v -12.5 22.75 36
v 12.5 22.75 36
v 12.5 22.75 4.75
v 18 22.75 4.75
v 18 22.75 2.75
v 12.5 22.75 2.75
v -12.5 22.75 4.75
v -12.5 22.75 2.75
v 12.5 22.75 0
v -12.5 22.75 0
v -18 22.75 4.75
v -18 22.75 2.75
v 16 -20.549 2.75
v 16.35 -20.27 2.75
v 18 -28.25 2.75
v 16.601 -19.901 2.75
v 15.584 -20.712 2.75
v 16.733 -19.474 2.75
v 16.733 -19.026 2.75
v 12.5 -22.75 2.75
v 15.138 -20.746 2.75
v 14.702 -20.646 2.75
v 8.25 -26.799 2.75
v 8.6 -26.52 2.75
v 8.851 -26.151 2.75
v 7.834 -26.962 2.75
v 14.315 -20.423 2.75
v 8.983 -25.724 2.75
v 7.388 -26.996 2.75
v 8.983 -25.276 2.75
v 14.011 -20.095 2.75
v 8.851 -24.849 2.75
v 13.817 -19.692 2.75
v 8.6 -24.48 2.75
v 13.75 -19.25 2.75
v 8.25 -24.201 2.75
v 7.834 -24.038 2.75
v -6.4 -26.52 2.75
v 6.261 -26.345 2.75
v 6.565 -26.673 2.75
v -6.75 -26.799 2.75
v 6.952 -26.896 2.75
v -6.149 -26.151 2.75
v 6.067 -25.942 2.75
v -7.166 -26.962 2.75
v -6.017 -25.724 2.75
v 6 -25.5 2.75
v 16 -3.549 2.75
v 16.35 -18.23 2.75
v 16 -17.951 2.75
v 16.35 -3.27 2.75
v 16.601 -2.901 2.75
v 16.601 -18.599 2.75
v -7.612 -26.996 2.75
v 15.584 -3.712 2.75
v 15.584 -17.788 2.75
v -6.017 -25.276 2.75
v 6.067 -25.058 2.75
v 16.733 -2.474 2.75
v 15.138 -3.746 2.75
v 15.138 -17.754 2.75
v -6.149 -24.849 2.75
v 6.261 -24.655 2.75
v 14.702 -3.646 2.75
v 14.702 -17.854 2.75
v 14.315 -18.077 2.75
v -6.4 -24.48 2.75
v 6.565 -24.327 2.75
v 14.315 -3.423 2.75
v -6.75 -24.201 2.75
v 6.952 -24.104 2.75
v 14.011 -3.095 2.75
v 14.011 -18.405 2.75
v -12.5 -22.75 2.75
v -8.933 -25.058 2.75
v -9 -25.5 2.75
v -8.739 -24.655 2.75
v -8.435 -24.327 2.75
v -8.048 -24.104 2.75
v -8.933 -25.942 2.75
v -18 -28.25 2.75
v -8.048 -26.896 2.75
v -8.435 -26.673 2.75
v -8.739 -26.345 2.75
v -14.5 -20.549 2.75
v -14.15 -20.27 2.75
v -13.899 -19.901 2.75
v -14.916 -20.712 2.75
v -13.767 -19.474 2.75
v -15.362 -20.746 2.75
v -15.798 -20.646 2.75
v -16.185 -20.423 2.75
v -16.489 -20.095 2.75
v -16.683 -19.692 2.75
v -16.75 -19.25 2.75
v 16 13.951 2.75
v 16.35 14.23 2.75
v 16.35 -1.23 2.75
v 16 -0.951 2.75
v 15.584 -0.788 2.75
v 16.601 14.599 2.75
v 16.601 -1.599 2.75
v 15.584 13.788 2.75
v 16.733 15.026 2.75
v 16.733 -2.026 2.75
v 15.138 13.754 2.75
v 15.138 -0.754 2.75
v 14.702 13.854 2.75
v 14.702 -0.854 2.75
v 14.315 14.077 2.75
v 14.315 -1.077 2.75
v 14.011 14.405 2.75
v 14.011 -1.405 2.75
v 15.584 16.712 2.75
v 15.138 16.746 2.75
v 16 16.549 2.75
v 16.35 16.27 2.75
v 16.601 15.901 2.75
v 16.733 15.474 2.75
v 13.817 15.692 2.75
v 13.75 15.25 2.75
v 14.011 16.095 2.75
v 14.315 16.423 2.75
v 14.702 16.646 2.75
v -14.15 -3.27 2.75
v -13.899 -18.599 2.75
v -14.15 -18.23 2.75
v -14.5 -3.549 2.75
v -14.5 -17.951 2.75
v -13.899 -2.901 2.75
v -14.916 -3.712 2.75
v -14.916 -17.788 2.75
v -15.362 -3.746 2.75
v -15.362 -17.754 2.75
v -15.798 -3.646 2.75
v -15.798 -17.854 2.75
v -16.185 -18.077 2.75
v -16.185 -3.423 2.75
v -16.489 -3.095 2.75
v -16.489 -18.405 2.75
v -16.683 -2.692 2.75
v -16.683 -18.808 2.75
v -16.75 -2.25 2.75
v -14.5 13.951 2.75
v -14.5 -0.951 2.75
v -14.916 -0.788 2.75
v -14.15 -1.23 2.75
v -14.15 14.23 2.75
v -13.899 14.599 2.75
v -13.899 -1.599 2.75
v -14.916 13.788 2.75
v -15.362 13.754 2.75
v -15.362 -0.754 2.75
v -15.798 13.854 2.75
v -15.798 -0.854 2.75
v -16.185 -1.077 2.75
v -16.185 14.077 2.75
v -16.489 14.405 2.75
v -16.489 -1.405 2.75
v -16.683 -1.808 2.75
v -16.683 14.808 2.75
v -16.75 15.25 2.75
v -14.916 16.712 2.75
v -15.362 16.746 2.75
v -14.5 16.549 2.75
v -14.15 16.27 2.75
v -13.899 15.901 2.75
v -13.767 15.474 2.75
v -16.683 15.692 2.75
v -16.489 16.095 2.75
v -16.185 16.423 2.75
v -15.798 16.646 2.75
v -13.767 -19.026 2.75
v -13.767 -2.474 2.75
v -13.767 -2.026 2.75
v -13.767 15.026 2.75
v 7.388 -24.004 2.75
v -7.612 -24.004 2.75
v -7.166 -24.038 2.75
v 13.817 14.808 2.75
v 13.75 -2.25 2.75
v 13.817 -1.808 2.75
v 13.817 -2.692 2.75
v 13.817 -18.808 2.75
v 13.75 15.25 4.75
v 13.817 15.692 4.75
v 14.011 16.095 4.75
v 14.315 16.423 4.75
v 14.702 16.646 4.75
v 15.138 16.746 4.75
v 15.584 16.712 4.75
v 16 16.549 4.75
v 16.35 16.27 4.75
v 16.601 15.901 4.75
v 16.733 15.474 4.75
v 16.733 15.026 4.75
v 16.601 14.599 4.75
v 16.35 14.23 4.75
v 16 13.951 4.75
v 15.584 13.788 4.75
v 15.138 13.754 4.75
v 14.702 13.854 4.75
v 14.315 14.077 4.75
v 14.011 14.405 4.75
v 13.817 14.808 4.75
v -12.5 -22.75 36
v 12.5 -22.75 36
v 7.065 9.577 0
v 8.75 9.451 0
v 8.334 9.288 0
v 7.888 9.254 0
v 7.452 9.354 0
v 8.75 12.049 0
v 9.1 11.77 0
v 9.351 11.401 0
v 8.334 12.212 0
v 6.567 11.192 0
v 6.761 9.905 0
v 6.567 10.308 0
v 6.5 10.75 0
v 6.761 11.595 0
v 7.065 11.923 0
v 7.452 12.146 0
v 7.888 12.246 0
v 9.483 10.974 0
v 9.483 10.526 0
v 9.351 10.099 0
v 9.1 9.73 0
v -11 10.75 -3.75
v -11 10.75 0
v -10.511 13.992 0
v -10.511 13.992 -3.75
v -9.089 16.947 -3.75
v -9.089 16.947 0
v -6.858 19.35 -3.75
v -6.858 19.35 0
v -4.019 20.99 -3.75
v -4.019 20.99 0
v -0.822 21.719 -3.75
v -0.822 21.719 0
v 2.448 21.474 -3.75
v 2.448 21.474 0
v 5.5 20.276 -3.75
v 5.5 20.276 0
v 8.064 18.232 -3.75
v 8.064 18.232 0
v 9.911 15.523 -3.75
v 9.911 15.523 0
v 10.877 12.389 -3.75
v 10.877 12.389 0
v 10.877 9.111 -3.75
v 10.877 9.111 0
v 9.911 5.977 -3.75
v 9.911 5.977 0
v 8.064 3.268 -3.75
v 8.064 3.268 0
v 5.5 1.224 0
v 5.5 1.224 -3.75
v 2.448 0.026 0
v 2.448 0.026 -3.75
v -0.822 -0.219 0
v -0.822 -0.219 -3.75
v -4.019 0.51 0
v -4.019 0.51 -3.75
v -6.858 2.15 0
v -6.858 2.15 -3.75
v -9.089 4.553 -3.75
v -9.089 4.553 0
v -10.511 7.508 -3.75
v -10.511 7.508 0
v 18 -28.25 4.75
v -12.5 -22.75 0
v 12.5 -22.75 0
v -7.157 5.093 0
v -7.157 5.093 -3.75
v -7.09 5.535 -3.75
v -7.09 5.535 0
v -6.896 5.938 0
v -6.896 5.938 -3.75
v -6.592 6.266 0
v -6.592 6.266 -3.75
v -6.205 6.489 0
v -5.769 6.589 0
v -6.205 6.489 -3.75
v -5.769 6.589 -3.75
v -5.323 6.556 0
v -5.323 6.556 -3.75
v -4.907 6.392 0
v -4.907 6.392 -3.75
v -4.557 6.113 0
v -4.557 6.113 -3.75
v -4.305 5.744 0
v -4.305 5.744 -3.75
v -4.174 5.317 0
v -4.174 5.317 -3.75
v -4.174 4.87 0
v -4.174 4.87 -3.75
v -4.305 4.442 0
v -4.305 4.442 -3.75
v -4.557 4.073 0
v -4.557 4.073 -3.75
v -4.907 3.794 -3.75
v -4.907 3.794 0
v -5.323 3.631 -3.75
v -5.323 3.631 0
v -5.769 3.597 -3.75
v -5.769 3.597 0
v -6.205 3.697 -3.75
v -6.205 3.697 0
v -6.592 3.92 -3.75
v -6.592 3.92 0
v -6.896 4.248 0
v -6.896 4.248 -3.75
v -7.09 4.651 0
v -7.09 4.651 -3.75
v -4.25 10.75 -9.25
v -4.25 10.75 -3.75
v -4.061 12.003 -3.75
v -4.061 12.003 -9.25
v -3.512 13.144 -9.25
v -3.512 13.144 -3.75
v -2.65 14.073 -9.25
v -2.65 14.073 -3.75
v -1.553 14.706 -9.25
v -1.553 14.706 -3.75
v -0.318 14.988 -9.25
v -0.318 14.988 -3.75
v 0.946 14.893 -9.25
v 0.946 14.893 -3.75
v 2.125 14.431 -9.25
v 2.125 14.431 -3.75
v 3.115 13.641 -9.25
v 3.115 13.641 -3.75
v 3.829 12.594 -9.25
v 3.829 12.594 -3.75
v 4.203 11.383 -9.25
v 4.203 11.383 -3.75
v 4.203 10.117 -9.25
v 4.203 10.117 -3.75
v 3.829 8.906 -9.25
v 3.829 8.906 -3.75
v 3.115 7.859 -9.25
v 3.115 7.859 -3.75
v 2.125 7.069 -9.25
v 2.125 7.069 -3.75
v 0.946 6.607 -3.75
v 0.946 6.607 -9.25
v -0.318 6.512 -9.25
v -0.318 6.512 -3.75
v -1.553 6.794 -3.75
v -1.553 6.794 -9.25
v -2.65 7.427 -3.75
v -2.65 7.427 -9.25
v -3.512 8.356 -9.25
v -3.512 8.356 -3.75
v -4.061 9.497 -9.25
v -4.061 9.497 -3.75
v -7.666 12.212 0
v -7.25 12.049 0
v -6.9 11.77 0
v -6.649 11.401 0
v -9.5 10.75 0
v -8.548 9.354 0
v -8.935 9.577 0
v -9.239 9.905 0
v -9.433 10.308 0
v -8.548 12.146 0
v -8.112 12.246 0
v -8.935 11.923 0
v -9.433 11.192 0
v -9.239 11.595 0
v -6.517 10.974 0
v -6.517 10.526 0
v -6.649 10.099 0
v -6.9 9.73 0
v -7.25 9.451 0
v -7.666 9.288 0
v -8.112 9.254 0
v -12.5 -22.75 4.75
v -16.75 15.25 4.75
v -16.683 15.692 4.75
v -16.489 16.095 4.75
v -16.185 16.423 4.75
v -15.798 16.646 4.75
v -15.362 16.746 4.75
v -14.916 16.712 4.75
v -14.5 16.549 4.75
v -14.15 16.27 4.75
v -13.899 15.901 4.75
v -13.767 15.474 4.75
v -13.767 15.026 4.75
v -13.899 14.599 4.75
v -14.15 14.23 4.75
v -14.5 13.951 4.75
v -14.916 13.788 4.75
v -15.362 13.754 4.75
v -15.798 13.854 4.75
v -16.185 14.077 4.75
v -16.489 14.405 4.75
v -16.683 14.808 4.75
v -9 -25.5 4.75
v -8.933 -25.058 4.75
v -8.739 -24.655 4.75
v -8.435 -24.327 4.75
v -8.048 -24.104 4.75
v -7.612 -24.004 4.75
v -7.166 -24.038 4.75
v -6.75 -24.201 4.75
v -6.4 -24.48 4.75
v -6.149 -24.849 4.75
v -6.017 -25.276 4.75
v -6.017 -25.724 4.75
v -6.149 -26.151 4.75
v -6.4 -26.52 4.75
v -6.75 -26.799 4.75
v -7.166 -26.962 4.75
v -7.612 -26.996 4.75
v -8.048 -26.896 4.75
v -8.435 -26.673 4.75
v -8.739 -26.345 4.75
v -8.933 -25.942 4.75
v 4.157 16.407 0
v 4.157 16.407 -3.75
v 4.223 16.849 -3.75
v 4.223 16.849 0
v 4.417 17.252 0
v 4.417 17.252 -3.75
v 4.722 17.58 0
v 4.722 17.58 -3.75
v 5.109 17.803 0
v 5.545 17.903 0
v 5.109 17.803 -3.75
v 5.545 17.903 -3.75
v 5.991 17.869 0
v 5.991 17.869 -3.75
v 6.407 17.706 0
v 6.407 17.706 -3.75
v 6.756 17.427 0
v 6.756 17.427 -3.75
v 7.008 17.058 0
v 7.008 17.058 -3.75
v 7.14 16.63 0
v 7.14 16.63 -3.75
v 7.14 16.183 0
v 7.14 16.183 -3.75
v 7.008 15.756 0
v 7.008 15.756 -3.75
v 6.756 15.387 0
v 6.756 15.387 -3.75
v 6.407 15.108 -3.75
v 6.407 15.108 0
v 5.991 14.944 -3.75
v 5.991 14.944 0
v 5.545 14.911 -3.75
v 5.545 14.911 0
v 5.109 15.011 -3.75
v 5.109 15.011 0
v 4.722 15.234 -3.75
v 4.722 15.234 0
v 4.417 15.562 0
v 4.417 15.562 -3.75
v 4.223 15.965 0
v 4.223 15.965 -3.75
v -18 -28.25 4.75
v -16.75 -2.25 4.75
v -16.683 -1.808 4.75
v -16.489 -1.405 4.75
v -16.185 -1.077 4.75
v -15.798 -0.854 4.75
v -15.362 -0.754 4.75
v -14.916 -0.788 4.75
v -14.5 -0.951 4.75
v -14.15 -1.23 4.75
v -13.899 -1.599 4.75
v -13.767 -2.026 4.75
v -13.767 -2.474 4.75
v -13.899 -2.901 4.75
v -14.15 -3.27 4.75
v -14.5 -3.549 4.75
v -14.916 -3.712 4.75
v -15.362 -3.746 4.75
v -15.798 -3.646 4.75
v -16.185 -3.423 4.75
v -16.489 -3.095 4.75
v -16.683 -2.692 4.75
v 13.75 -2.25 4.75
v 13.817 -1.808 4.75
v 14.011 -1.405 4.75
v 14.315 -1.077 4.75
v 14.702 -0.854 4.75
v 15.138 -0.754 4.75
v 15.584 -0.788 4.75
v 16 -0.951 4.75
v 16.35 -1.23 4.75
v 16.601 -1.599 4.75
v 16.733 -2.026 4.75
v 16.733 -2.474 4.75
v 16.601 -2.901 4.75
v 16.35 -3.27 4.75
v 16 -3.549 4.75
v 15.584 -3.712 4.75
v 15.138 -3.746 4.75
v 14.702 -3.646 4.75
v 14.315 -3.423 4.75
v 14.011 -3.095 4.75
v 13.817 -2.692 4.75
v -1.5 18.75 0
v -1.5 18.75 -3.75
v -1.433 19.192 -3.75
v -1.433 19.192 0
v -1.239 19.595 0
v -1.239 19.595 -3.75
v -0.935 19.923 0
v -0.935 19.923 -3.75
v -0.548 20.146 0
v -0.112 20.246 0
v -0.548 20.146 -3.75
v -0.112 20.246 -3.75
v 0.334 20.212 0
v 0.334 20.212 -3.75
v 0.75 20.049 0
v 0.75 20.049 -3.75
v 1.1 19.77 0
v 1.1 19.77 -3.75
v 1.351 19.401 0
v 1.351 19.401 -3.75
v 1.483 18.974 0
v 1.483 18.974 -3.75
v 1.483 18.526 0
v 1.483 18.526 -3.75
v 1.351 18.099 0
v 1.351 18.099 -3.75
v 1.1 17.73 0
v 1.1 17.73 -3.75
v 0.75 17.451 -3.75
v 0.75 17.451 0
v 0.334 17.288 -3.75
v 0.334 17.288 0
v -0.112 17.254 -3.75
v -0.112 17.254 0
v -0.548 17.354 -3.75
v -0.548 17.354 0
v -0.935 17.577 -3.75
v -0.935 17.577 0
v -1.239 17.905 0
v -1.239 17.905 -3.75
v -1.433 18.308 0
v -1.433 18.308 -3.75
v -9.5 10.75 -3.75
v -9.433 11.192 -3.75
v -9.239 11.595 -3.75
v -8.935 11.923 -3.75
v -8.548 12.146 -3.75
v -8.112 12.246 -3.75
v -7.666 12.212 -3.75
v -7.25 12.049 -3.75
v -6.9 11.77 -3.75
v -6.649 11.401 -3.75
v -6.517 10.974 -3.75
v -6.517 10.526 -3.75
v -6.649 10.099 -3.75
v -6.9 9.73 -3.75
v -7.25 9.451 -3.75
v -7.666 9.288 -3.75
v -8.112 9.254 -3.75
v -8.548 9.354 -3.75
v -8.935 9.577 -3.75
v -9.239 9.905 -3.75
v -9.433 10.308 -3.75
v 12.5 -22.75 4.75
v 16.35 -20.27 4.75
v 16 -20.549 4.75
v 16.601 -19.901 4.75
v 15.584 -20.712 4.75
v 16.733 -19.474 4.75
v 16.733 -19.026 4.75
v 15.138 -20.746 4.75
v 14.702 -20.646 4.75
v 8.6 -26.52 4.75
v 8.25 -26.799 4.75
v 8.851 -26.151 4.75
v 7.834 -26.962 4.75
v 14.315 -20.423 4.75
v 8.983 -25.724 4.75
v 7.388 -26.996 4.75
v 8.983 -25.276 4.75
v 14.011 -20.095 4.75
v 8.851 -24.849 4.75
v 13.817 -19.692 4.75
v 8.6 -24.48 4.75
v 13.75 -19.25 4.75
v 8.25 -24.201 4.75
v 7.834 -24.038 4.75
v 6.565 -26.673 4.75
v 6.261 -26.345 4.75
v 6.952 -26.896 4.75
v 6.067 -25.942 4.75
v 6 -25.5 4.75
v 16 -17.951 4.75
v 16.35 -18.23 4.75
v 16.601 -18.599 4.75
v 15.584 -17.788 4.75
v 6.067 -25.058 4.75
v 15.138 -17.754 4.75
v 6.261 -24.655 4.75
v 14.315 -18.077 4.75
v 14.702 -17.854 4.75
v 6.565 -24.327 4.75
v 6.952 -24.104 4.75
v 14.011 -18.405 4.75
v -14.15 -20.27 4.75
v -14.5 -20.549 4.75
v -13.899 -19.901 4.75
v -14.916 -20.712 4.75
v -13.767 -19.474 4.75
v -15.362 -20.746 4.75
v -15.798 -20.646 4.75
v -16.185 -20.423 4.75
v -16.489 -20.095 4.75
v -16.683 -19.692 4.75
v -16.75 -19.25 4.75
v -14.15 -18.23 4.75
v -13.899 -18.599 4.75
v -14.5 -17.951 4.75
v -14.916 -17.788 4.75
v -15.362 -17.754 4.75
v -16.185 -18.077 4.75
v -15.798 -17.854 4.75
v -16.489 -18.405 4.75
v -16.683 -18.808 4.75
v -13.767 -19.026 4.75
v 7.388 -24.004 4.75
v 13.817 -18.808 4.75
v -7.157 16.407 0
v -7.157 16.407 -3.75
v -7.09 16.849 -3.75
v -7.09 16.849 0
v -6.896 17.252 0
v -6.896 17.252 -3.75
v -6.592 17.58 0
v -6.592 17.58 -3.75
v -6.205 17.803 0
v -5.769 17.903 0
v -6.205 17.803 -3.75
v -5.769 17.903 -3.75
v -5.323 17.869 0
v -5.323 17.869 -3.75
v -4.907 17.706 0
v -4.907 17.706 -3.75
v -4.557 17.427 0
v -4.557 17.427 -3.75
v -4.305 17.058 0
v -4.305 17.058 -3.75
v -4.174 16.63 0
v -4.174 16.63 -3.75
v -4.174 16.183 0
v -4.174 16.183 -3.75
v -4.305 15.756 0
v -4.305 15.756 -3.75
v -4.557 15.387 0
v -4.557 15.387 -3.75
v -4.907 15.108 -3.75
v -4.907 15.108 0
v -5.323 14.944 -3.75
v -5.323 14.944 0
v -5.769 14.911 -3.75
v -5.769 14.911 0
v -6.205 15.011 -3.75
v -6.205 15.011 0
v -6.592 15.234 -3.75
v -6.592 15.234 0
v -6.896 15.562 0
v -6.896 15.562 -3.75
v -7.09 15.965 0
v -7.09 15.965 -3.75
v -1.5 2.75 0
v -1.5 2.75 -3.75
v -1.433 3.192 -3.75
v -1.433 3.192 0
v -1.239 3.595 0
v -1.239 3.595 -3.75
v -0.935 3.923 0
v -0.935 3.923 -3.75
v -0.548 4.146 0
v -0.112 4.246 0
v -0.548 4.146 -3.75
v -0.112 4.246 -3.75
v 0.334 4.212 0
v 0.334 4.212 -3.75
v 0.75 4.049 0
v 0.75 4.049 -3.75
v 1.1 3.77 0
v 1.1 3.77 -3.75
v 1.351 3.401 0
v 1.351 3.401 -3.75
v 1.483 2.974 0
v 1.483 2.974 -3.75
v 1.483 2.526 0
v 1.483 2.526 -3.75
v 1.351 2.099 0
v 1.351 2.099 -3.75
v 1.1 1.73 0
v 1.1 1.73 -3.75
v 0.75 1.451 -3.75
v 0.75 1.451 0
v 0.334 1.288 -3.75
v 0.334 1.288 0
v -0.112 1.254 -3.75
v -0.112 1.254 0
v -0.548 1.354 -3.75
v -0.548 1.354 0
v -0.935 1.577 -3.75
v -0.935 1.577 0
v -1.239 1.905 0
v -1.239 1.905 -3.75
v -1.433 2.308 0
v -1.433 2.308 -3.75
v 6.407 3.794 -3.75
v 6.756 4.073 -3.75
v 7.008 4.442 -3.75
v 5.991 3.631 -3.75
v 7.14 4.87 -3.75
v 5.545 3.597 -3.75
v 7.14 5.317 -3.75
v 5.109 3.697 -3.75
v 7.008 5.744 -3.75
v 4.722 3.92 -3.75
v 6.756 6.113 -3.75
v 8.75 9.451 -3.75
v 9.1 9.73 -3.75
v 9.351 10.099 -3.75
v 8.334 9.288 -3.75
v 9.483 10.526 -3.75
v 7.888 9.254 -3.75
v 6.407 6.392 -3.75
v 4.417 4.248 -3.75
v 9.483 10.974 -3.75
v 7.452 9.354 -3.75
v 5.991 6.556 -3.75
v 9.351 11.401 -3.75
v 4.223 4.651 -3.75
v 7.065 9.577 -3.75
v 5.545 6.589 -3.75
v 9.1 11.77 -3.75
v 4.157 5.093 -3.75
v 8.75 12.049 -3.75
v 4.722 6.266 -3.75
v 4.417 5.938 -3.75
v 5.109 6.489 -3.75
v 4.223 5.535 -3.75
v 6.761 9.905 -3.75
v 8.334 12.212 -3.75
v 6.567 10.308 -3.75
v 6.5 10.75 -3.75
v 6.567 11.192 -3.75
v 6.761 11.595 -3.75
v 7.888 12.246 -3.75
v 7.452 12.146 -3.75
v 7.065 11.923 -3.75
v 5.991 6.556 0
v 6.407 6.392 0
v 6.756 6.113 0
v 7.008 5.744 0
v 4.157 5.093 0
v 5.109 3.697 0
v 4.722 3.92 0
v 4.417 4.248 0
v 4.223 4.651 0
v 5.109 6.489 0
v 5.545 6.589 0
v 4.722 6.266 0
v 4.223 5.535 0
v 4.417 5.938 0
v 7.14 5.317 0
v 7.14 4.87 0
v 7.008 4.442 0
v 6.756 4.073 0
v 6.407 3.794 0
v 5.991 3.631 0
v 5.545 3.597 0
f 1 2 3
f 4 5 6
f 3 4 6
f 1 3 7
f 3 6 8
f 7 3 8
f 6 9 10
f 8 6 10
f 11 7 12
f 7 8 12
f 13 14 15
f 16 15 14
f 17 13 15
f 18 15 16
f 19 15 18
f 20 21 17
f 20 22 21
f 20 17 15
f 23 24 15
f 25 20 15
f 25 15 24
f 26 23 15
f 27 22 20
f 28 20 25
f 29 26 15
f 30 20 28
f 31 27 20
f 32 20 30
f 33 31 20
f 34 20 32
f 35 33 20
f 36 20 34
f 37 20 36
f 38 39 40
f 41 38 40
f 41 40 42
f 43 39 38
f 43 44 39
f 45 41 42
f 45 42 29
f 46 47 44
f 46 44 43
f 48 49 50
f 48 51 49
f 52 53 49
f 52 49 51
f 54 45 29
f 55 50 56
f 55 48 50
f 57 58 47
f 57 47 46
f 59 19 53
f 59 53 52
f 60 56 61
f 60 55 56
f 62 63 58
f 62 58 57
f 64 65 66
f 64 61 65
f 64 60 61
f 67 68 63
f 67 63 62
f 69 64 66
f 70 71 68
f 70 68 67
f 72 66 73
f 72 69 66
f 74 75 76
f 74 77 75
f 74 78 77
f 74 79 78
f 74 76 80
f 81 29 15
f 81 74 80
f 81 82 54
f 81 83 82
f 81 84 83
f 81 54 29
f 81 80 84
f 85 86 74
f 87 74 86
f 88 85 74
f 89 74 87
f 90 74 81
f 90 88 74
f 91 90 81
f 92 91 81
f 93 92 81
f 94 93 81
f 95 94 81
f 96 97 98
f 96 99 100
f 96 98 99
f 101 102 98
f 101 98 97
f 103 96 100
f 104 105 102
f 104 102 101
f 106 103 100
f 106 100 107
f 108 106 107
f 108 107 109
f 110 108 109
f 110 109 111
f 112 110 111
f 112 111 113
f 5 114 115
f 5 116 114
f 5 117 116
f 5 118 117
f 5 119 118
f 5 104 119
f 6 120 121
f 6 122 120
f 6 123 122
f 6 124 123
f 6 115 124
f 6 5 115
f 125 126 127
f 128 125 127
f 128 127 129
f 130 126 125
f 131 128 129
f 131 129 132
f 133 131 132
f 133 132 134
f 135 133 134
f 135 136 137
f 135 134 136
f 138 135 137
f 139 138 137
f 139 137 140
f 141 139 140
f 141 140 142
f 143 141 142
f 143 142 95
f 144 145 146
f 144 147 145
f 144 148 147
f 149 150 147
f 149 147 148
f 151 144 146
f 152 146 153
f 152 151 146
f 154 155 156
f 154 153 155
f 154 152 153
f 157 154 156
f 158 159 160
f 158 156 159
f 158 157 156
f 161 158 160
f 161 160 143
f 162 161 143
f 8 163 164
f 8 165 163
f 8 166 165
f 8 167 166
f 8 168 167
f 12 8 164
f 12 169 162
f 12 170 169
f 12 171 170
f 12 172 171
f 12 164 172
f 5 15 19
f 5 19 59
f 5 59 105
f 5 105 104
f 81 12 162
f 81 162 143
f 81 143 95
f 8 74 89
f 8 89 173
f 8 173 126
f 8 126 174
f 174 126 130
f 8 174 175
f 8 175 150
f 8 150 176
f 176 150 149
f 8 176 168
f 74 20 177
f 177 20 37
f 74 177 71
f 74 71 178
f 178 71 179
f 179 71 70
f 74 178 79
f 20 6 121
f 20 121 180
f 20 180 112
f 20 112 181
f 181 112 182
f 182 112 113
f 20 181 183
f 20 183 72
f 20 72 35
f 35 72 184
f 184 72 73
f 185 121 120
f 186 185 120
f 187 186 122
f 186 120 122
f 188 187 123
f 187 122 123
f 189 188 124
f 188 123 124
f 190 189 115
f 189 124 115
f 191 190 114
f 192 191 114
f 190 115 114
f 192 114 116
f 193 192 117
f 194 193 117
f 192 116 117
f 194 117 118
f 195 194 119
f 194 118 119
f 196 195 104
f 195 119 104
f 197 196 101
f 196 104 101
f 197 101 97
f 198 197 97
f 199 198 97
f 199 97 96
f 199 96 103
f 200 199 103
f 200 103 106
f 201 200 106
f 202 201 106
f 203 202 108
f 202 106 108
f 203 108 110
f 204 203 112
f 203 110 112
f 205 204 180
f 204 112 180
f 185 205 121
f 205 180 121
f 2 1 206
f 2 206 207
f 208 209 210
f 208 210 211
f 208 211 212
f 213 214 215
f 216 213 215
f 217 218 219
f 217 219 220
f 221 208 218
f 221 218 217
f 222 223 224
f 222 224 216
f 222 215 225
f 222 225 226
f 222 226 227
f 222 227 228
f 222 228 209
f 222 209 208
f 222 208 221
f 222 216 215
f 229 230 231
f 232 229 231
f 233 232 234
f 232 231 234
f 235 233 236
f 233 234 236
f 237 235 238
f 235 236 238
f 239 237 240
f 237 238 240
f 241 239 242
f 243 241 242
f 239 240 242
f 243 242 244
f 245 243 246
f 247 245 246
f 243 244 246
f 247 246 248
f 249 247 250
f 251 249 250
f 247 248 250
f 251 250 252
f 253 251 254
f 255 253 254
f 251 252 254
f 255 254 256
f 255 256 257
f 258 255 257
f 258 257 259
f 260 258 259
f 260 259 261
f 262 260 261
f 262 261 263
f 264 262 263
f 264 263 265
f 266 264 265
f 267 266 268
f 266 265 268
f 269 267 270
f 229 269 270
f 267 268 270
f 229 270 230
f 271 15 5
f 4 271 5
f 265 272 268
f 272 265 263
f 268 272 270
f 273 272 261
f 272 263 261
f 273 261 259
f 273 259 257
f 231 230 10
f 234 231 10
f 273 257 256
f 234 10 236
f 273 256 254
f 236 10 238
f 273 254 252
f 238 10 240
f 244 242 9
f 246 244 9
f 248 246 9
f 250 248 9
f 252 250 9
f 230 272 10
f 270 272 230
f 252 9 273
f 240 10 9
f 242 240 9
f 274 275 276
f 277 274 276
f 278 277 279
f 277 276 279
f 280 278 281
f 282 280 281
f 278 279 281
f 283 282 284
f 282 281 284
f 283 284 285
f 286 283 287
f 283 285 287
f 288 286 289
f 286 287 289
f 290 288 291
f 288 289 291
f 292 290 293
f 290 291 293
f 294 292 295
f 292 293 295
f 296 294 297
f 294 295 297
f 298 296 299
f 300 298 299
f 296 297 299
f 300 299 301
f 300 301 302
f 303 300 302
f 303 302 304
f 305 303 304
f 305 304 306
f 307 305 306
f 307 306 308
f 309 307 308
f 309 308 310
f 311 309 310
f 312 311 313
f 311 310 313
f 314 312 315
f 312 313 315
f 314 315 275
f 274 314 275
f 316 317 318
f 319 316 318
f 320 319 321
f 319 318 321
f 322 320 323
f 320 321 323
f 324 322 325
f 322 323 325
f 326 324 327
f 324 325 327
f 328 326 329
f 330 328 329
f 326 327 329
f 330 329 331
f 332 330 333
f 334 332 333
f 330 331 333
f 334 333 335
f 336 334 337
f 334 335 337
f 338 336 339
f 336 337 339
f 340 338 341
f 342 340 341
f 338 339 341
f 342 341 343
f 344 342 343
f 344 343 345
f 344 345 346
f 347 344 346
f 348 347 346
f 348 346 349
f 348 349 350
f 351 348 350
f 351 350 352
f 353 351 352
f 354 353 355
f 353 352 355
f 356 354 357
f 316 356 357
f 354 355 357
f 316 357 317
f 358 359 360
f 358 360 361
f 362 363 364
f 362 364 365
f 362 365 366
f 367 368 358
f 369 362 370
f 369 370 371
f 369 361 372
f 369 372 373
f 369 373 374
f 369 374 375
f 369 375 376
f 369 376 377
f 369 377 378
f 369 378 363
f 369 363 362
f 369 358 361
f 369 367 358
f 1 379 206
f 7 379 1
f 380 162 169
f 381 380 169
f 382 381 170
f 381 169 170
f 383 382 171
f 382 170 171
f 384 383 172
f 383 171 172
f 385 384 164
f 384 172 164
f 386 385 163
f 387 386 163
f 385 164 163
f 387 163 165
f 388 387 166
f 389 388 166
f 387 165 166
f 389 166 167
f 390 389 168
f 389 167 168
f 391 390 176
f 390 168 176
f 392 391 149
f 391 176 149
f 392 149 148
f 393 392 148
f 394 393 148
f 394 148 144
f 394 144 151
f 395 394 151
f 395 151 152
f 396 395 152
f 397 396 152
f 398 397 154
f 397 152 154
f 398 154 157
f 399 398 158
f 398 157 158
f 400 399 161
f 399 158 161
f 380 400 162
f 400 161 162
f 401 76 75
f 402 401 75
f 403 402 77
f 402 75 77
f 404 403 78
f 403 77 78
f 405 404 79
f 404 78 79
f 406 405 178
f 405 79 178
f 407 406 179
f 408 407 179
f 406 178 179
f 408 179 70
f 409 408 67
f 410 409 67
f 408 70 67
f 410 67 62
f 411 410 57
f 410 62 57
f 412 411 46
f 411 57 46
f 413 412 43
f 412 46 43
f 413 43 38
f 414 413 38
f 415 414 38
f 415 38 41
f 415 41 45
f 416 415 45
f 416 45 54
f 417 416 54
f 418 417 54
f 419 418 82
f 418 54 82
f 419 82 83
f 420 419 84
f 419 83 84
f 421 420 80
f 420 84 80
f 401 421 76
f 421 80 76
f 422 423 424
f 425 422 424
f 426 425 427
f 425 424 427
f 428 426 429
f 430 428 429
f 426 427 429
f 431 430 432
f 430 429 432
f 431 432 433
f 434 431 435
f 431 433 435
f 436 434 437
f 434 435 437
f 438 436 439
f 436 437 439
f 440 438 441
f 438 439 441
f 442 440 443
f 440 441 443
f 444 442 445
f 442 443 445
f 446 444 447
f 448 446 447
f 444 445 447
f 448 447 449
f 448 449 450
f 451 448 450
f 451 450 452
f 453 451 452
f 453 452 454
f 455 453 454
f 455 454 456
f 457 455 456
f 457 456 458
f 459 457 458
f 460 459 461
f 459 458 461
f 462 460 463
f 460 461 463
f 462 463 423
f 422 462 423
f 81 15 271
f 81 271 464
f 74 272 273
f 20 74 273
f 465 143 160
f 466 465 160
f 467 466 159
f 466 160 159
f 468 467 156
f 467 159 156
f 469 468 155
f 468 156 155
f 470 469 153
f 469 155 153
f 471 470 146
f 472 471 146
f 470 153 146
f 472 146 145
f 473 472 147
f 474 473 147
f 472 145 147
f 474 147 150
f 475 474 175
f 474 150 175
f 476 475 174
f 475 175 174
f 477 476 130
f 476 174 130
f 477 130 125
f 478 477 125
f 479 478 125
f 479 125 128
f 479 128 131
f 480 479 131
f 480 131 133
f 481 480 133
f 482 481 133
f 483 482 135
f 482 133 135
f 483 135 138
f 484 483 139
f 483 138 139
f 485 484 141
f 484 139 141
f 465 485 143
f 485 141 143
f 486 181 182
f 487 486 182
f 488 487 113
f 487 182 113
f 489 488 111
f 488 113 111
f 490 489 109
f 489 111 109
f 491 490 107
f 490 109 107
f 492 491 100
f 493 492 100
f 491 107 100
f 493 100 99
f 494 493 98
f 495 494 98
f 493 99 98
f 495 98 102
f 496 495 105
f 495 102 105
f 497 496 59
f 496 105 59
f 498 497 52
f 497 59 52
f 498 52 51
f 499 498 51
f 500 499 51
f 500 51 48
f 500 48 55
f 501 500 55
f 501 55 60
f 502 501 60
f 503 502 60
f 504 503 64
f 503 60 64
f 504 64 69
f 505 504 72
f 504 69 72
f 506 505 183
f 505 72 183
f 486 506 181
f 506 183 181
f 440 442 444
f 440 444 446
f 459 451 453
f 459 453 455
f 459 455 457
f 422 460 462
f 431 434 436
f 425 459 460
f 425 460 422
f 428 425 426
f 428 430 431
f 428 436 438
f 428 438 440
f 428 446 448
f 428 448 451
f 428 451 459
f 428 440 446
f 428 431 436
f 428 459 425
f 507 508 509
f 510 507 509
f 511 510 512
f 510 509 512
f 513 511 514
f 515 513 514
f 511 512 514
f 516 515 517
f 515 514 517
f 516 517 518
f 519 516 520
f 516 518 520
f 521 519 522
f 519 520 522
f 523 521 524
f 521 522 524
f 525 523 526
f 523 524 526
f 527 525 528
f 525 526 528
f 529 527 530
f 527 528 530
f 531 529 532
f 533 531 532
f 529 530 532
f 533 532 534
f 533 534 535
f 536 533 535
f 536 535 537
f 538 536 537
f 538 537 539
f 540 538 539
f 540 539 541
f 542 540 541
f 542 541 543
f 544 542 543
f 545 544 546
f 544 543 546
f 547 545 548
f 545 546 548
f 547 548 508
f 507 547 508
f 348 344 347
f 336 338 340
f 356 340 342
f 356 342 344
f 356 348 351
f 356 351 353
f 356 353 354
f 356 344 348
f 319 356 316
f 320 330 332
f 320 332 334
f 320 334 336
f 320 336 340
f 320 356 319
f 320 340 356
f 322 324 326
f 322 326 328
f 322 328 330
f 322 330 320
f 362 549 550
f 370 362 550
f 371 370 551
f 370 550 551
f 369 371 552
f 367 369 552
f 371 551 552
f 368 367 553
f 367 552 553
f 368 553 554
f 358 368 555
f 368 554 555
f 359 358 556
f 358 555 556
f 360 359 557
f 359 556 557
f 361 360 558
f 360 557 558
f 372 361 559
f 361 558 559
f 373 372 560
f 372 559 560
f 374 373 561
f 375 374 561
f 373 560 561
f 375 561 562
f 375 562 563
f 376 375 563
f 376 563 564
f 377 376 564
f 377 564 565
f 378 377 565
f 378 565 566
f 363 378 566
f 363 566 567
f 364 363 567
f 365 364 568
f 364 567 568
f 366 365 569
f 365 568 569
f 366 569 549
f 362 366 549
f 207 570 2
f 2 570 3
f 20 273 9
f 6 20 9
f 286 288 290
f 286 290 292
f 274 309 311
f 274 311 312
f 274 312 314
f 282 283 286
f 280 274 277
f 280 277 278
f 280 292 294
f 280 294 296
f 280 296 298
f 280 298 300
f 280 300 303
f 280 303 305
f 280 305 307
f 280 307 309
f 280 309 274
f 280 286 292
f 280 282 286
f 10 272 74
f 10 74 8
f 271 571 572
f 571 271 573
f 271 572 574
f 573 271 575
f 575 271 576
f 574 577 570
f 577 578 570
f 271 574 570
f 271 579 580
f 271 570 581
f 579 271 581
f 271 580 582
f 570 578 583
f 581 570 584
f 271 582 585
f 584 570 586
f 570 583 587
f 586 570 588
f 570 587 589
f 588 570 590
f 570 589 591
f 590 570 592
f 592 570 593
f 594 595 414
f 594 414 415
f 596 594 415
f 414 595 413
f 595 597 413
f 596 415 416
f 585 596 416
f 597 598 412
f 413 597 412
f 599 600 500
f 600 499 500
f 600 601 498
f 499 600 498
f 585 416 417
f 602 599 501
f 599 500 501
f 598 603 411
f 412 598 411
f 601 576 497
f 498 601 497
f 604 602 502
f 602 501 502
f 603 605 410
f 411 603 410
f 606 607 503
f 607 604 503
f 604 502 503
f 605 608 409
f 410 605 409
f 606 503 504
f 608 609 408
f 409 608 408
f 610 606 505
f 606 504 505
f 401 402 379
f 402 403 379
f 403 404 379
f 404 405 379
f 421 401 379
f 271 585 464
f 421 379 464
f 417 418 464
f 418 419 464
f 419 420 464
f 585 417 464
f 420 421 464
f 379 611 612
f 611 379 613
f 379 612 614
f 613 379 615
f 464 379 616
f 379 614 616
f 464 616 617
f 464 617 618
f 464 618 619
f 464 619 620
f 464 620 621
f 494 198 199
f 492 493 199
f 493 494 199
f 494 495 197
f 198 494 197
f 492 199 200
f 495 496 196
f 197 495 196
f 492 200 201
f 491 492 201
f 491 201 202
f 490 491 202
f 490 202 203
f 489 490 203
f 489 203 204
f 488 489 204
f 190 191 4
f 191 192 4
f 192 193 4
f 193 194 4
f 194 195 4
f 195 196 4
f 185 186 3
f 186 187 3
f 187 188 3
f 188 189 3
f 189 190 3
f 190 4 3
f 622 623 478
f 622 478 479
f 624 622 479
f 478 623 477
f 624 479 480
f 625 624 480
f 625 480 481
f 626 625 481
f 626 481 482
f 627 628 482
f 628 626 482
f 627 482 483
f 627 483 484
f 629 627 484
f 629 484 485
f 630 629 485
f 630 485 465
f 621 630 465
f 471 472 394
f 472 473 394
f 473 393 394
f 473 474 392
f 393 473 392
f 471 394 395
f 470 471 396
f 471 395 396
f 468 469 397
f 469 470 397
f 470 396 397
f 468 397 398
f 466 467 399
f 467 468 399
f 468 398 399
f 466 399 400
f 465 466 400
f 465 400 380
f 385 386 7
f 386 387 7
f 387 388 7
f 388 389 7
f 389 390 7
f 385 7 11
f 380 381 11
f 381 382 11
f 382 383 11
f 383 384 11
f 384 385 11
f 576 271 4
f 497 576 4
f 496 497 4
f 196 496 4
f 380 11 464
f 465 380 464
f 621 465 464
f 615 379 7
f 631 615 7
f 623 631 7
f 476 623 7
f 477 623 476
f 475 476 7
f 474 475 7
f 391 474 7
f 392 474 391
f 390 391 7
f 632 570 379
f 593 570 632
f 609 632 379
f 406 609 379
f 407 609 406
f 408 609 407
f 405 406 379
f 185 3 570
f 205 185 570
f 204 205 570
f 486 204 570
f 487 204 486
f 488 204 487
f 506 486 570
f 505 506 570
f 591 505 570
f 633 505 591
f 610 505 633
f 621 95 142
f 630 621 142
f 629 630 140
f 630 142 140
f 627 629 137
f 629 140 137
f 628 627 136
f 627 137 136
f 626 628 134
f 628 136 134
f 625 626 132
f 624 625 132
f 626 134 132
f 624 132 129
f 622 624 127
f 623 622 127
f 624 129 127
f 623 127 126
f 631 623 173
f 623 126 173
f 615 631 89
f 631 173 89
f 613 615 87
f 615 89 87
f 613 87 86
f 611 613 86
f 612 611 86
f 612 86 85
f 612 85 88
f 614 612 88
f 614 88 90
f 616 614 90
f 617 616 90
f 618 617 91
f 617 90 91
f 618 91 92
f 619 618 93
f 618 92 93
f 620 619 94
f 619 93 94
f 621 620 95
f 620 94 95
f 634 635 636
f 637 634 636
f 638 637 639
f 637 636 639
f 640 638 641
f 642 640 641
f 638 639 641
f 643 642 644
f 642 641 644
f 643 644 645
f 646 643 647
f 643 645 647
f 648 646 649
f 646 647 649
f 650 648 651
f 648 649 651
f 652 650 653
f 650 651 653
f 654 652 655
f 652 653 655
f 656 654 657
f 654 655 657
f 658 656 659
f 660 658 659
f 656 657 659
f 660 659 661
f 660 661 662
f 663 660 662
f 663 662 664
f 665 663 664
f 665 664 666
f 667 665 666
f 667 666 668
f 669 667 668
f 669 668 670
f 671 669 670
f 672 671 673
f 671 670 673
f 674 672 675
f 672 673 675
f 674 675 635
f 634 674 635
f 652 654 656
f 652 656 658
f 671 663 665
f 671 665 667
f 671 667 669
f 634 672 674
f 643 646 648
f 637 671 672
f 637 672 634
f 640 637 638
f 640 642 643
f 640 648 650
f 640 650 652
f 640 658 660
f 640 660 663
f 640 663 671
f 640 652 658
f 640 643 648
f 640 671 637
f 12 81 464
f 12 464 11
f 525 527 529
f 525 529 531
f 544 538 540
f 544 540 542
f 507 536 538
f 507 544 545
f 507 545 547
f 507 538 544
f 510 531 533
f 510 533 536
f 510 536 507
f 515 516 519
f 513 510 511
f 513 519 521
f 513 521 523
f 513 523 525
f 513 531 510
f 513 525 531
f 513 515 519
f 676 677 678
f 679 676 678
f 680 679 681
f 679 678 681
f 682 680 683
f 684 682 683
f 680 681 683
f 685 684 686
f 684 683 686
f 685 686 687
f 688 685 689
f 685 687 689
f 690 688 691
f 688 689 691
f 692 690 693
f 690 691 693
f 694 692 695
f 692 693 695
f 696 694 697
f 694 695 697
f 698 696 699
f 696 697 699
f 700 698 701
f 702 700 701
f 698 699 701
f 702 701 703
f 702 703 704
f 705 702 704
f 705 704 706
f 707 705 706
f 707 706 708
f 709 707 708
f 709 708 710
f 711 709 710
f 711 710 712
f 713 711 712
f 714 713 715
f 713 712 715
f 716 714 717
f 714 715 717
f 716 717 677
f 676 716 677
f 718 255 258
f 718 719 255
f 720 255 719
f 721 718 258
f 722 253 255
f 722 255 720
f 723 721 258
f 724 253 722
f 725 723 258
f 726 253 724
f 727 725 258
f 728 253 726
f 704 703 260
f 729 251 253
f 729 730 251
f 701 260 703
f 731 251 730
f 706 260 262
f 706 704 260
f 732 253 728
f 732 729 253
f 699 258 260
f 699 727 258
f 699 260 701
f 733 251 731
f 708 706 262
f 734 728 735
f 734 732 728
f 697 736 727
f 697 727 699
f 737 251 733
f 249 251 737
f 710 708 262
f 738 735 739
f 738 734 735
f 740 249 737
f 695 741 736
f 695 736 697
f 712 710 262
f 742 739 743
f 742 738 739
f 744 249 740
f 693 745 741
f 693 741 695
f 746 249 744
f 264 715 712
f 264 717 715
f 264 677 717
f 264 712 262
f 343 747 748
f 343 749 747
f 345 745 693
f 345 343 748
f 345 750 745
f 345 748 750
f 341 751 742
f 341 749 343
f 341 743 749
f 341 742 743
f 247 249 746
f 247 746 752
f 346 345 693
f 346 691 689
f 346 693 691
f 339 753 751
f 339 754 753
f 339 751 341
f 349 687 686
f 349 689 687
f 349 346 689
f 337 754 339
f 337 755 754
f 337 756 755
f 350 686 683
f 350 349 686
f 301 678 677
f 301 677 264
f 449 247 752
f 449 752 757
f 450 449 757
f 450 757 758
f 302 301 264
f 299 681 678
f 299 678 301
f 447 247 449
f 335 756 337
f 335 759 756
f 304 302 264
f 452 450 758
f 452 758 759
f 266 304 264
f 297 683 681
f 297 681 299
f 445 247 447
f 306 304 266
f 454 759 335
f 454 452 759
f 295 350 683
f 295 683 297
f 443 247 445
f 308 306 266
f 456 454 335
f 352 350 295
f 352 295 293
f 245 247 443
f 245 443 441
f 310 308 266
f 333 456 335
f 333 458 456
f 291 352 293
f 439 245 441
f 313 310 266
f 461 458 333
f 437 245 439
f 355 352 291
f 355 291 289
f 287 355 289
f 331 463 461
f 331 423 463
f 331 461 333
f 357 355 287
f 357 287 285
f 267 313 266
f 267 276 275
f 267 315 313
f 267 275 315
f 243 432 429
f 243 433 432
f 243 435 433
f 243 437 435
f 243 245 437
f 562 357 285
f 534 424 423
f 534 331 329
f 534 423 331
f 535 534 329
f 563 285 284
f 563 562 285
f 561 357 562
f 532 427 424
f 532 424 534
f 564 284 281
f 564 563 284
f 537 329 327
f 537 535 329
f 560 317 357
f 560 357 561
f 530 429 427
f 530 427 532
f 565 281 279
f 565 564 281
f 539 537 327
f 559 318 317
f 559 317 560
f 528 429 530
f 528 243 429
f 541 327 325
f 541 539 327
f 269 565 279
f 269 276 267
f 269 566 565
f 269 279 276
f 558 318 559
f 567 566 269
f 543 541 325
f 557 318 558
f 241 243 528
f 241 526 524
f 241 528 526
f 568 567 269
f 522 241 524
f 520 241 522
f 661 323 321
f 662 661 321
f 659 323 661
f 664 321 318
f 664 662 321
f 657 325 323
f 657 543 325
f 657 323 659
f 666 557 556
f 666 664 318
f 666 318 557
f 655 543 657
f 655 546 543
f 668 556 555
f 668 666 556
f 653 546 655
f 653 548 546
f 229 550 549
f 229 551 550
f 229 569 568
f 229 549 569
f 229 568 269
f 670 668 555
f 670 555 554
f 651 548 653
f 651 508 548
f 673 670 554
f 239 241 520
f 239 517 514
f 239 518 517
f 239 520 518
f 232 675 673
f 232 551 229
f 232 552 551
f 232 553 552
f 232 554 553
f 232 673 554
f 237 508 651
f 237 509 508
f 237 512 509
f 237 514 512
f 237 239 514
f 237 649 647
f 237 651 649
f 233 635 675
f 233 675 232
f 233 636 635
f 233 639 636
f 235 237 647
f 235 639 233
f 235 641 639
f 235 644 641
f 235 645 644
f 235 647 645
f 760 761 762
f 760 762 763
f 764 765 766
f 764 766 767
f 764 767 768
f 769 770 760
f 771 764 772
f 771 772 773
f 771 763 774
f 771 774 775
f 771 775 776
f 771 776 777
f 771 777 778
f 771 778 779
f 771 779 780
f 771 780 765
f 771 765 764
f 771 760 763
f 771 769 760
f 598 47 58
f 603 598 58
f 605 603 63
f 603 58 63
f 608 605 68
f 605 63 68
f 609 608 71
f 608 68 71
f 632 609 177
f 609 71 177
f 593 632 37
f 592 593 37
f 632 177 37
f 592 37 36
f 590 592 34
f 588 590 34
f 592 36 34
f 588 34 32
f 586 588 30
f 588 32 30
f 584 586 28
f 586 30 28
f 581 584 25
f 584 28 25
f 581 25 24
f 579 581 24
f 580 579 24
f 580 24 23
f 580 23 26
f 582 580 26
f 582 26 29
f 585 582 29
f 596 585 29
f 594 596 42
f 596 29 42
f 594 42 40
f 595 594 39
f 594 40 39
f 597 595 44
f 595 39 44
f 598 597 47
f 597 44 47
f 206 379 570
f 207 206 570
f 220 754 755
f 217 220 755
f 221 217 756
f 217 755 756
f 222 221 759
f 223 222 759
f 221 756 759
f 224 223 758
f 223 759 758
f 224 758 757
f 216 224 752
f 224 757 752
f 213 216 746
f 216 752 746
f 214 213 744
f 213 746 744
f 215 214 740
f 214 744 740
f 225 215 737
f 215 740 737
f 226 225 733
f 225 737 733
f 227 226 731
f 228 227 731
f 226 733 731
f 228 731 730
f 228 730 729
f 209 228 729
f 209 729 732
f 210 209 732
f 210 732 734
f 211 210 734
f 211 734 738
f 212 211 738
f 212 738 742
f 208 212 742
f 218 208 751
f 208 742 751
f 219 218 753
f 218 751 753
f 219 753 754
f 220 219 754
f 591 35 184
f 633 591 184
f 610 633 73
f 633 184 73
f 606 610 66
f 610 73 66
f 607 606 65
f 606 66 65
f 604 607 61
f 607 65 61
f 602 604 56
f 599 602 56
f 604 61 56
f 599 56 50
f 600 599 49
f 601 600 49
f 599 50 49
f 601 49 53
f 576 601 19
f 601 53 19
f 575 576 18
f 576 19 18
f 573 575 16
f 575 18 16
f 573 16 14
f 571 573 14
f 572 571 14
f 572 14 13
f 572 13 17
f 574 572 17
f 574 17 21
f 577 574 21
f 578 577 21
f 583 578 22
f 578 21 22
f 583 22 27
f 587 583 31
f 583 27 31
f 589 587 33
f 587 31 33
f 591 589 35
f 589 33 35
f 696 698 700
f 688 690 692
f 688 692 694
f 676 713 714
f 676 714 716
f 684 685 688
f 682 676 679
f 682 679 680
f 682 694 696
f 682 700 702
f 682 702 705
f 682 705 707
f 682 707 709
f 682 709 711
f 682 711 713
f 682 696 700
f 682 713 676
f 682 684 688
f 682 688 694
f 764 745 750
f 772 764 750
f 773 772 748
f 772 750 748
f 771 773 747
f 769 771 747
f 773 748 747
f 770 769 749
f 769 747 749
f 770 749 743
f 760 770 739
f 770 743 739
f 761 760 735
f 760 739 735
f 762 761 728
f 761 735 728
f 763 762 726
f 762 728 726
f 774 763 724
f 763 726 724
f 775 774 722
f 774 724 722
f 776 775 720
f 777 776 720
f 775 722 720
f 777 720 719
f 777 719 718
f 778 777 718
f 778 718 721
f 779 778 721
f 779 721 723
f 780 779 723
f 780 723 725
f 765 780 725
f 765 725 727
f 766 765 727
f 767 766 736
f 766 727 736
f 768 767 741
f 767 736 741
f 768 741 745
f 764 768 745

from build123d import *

# Parameters (mm, degrees)
SKETCH1_W           = 25
SKETCH1_H           = 45.5
BOSS_EXTRUDE1_DEPTH = 36
BOSS_EXTRUDE2_START = -2.75
SKETCH2_W           = 36
SKETCH2_H           = 51
SKETCH2_R           = 1.5
BOSS_EXTRUDE2_DEPTH = 2
SKETCH3_R           = 11
BOSS_EXTRUDE3_DEPTH = 3.75
SKETCH4_R           = 1.5
CUT_EXTRUDE1_DEPTH  = 3.75
SKETCH5_R           = 4.25
BOSS_EXTRUDE4_DEPTH = 5.5


with BuildPart() as part:
    # Sketch1 → Boss-Extrude1 (new body)
    with BuildSketch(Plane.XY):
        Rectangle(SKETCH1_W, SKETCH1_H)
    extrude(amount=BOSS_EXTRUDE1_DEPTH)

    # Sketch2 → Boss-Extrude2 (add)
    with BuildSketch(Plane(origin=(0, 0, 0), x_dir=(-1, 0, 0), z_dir=(0, 0, -1)).offset(BOSS_EXTRUDE2_START)):
        with Locations((0, -2.75)):
            Rectangle(SKETCH2_W, SKETCH2_H)
        with Locations((-15.25, 15.25)):
            Circle(SKETCH2_R, mode=Mode.SUBTRACT)
        with Locations((-15.25, -2.25)):
            Circle(SKETCH2_R, mode=Mode.SUBTRACT)
        with Locations((-15.25, -19.25)):
            Circle(SKETCH2_R, mode=Mode.SUBTRACT)
        with Locations((-7.5, -25.5)):
            Circle(SKETCH2_R, mode=Mode.SUBTRACT)
        with Locations((7.5, -25.5)):
            Circle(SKETCH2_R, mode=Mode.SUBTRACT)
        with Locations((15.25, -19.25)):
            Circle(SKETCH2_R, mode=Mode.SUBTRACT)
        with Locations((15.25, -2.25)):
            Circle(SKETCH2_R, mode=Mode.SUBTRACT)
        with Locations((15.25, 15.25)):
            Circle(SKETCH2_R, mode=Mode.SUBTRACT)
    extrude(amount=-BOSS_EXTRUDE2_DEPTH)

    # Sketch3 → Boss-Extrude3 (add)
    with BuildSketch(Plane(origin=(0, 0, 0), x_dir=(-1, 0, 0), z_dir=(0, 0, -1))):
        with Locations((0, 10.75)):
            Circle(SKETCH3_R)
    extrude(amount=BOSS_EXTRUDE3_DEPTH)

    # Sketch4 → Cut-Extrude1 (cut)
    with BuildSketch(Plane(origin=(0, 0, -3.75), x_dir=(-1, 0, 0), z_dir=(0, 0, -1))):
        with Locations((0, 18.75)):
            Circle(SKETCH4_R)
        with Locations((-5.656854249, 16.406854249)):
            Circle(SKETCH4_R)
        with Locations((-8, 10.75)):
            Circle(SKETCH4_R)
        with Locations((-5.656854249, 5.093145751)):
            Circle(SKETCH4_R)
        with Locations((0, 2.75)):
            Circle(SKETCH4_R)
        with Locations((5.656854249, 5.093145751)):
            Circle(SKETCH4_R)
        with Locations((8, 10.75)):
            Circle(SKETCH4_R)
        with Locations((5.656854249, 16.406854249)):
            Circle(SKETCH4_R)
    extrude(amount=-CUT_EXTRUDE1_DEPTH, mode=Mode.SUBTRACT)

    # Sketch5 → Boss-Extrude4 (add)
    with BuildSketch(Plane(origin=(0, 0, -3.75), x_dir=(-1, 0, 0), z_dir=(0, 0, -1))):
        with Locations((0, 10.75)):
            Circle(SKETCH5_R)
    extrude(amount=BOSS_EXTRUDE4_DEPTH)


solid = part.part
